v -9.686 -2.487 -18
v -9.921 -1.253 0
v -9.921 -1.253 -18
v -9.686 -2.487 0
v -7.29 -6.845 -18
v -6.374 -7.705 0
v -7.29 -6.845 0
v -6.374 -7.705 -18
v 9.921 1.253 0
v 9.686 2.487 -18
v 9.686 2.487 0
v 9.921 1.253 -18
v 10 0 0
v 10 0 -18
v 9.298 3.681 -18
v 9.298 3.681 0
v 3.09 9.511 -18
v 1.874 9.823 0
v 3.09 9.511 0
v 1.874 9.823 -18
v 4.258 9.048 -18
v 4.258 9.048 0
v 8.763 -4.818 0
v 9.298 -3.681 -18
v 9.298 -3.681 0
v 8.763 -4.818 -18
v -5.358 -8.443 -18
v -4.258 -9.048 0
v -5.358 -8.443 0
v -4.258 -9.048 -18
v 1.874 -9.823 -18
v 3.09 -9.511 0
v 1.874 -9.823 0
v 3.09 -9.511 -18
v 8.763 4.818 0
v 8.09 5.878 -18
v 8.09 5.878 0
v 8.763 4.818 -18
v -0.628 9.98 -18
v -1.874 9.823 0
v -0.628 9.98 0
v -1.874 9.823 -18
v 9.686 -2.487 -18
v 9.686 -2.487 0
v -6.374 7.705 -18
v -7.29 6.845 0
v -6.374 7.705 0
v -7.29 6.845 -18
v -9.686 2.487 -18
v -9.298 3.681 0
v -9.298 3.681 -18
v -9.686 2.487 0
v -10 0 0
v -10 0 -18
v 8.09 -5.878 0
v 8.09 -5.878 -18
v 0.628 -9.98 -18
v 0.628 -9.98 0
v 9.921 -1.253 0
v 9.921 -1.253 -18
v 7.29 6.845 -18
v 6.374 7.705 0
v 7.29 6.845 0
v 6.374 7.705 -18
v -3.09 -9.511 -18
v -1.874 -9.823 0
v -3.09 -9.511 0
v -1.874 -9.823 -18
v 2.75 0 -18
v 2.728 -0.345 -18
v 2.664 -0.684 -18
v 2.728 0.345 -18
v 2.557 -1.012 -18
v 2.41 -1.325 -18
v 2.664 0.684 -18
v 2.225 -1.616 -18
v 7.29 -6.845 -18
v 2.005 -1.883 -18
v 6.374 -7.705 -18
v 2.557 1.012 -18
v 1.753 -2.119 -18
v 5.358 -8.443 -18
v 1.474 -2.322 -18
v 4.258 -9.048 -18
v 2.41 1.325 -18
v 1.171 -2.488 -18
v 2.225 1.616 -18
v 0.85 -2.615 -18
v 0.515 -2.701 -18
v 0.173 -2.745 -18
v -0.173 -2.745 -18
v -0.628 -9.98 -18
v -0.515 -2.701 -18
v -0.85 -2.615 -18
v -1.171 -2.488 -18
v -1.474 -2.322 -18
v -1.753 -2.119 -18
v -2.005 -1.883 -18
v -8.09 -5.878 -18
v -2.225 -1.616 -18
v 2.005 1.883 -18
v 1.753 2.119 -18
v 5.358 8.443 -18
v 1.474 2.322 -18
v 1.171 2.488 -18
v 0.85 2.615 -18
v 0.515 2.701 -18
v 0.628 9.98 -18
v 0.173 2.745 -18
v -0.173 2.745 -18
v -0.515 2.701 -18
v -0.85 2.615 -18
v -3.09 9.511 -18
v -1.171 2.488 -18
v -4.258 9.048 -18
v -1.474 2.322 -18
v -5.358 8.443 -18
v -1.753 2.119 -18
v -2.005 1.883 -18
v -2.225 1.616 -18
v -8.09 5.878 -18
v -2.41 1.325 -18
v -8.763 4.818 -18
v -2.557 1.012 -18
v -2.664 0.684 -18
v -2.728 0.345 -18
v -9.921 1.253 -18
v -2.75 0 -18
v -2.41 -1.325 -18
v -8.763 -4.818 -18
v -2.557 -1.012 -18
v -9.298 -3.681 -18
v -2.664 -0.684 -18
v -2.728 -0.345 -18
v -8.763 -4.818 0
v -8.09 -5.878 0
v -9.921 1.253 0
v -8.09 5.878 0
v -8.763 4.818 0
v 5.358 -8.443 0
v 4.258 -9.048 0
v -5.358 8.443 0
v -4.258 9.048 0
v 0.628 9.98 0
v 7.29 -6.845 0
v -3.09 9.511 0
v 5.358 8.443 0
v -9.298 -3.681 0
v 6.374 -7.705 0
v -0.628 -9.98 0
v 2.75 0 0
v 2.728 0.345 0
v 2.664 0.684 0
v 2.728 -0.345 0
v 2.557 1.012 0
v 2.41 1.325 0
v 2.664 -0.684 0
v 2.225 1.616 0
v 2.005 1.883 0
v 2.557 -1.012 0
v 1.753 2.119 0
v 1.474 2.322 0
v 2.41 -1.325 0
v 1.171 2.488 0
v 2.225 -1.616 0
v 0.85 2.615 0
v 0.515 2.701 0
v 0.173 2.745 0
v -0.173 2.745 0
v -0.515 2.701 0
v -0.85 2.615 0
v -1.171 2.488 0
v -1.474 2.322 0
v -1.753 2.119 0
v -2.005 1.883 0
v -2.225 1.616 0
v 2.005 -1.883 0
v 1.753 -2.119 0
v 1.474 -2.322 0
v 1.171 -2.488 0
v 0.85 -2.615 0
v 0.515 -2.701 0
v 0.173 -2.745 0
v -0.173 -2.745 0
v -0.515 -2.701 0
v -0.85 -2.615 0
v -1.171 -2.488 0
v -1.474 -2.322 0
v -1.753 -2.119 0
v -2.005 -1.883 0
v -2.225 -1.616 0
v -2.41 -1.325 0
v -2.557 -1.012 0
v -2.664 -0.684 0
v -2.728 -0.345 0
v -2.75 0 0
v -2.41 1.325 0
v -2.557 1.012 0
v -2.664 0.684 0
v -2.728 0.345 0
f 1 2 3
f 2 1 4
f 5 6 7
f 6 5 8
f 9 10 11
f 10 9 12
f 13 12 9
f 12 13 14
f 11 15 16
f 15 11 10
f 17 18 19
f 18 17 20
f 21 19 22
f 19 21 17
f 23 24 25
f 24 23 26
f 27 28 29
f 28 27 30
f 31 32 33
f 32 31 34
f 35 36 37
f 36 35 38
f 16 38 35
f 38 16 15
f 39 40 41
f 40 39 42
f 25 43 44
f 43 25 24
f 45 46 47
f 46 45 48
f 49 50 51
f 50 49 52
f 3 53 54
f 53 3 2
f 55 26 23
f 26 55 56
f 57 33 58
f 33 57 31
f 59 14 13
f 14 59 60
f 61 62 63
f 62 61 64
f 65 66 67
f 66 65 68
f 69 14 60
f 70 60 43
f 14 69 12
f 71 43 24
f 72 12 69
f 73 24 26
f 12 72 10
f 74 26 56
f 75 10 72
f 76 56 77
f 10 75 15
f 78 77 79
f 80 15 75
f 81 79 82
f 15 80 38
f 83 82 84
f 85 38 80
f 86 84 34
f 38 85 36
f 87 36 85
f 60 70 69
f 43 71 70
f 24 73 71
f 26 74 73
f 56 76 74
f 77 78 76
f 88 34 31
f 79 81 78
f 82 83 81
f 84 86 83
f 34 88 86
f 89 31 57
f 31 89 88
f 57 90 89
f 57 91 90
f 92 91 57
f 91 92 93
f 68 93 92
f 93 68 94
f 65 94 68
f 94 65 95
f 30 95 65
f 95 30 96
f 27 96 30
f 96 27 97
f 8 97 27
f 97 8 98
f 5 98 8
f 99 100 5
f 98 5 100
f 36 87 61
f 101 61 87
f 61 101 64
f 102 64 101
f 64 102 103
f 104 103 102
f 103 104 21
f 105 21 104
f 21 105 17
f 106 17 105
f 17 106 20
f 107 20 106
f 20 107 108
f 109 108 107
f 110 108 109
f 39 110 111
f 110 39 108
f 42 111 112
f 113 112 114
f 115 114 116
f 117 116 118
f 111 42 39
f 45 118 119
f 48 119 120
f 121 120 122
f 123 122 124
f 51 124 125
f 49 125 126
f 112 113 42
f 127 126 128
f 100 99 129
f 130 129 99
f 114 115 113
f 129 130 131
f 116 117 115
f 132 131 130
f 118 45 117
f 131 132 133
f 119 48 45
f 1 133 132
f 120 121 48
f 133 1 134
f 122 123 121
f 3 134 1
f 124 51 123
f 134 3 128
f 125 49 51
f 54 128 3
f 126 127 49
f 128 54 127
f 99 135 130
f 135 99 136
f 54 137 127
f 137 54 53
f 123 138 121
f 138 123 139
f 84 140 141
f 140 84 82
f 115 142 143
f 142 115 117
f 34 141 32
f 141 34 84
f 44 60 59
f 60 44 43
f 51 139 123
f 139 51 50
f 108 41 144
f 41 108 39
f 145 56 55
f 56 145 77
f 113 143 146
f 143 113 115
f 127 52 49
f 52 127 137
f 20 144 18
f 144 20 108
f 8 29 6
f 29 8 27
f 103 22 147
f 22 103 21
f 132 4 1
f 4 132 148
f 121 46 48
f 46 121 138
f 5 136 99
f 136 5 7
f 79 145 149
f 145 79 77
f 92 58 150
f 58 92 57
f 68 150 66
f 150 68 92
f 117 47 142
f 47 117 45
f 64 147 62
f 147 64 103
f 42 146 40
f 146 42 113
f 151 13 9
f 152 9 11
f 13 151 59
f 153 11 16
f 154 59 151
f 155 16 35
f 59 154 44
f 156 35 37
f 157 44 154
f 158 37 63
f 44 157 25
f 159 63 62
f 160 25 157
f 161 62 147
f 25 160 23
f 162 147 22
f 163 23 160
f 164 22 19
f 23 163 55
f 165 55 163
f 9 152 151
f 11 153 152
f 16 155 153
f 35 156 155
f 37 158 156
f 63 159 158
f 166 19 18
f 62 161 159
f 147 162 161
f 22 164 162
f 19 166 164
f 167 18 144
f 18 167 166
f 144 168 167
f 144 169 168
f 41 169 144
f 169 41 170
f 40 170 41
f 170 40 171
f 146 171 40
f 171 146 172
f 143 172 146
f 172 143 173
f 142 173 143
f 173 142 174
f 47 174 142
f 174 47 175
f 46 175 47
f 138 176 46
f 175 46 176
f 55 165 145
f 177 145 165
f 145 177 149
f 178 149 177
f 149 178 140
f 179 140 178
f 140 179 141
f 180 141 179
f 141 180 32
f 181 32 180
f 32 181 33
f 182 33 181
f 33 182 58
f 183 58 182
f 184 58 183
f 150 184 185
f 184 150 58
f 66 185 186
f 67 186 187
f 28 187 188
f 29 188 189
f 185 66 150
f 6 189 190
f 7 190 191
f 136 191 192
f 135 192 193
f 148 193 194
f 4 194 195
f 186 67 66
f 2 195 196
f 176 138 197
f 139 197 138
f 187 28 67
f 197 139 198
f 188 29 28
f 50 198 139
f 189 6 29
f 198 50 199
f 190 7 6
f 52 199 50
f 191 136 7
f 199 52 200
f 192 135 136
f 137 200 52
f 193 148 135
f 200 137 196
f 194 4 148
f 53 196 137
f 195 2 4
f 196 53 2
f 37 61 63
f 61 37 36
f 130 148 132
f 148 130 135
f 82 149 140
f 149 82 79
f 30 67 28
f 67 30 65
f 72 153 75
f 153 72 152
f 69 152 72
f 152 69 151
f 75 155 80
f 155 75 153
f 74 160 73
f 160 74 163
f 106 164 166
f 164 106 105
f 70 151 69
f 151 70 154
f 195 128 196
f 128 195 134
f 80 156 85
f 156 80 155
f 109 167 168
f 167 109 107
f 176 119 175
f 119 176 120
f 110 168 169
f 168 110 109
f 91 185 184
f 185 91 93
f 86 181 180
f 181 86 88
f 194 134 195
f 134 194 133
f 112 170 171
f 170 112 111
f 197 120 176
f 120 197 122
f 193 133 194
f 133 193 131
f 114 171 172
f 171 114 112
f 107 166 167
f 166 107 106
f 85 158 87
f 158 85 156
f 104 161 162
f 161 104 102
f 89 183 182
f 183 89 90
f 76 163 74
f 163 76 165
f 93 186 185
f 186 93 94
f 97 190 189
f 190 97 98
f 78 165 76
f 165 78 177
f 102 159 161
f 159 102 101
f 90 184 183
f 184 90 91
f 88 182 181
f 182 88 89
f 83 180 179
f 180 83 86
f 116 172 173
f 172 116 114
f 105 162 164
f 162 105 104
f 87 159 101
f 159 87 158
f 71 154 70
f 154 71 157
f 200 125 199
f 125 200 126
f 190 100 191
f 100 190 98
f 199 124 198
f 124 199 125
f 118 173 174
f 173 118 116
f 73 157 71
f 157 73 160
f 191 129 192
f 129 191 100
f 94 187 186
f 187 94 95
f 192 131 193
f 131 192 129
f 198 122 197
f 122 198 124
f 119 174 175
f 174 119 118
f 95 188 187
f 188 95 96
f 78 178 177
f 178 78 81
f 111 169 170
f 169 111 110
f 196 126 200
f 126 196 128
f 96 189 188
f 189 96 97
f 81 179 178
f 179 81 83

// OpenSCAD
$fn = 50;


difference() {
	union() {
		translate(v = [0, 0, -18.0000000000]) {
			cylinder(h = 18, r = 10.0000000000);
		}
		cylinder(h = 0, r = 16.0000000000);
	}
	union() {
		#translate(v = [0, 0, -18]) {
			cylinder(h = 18, r = 2.7500000000);
		}
	}
}
